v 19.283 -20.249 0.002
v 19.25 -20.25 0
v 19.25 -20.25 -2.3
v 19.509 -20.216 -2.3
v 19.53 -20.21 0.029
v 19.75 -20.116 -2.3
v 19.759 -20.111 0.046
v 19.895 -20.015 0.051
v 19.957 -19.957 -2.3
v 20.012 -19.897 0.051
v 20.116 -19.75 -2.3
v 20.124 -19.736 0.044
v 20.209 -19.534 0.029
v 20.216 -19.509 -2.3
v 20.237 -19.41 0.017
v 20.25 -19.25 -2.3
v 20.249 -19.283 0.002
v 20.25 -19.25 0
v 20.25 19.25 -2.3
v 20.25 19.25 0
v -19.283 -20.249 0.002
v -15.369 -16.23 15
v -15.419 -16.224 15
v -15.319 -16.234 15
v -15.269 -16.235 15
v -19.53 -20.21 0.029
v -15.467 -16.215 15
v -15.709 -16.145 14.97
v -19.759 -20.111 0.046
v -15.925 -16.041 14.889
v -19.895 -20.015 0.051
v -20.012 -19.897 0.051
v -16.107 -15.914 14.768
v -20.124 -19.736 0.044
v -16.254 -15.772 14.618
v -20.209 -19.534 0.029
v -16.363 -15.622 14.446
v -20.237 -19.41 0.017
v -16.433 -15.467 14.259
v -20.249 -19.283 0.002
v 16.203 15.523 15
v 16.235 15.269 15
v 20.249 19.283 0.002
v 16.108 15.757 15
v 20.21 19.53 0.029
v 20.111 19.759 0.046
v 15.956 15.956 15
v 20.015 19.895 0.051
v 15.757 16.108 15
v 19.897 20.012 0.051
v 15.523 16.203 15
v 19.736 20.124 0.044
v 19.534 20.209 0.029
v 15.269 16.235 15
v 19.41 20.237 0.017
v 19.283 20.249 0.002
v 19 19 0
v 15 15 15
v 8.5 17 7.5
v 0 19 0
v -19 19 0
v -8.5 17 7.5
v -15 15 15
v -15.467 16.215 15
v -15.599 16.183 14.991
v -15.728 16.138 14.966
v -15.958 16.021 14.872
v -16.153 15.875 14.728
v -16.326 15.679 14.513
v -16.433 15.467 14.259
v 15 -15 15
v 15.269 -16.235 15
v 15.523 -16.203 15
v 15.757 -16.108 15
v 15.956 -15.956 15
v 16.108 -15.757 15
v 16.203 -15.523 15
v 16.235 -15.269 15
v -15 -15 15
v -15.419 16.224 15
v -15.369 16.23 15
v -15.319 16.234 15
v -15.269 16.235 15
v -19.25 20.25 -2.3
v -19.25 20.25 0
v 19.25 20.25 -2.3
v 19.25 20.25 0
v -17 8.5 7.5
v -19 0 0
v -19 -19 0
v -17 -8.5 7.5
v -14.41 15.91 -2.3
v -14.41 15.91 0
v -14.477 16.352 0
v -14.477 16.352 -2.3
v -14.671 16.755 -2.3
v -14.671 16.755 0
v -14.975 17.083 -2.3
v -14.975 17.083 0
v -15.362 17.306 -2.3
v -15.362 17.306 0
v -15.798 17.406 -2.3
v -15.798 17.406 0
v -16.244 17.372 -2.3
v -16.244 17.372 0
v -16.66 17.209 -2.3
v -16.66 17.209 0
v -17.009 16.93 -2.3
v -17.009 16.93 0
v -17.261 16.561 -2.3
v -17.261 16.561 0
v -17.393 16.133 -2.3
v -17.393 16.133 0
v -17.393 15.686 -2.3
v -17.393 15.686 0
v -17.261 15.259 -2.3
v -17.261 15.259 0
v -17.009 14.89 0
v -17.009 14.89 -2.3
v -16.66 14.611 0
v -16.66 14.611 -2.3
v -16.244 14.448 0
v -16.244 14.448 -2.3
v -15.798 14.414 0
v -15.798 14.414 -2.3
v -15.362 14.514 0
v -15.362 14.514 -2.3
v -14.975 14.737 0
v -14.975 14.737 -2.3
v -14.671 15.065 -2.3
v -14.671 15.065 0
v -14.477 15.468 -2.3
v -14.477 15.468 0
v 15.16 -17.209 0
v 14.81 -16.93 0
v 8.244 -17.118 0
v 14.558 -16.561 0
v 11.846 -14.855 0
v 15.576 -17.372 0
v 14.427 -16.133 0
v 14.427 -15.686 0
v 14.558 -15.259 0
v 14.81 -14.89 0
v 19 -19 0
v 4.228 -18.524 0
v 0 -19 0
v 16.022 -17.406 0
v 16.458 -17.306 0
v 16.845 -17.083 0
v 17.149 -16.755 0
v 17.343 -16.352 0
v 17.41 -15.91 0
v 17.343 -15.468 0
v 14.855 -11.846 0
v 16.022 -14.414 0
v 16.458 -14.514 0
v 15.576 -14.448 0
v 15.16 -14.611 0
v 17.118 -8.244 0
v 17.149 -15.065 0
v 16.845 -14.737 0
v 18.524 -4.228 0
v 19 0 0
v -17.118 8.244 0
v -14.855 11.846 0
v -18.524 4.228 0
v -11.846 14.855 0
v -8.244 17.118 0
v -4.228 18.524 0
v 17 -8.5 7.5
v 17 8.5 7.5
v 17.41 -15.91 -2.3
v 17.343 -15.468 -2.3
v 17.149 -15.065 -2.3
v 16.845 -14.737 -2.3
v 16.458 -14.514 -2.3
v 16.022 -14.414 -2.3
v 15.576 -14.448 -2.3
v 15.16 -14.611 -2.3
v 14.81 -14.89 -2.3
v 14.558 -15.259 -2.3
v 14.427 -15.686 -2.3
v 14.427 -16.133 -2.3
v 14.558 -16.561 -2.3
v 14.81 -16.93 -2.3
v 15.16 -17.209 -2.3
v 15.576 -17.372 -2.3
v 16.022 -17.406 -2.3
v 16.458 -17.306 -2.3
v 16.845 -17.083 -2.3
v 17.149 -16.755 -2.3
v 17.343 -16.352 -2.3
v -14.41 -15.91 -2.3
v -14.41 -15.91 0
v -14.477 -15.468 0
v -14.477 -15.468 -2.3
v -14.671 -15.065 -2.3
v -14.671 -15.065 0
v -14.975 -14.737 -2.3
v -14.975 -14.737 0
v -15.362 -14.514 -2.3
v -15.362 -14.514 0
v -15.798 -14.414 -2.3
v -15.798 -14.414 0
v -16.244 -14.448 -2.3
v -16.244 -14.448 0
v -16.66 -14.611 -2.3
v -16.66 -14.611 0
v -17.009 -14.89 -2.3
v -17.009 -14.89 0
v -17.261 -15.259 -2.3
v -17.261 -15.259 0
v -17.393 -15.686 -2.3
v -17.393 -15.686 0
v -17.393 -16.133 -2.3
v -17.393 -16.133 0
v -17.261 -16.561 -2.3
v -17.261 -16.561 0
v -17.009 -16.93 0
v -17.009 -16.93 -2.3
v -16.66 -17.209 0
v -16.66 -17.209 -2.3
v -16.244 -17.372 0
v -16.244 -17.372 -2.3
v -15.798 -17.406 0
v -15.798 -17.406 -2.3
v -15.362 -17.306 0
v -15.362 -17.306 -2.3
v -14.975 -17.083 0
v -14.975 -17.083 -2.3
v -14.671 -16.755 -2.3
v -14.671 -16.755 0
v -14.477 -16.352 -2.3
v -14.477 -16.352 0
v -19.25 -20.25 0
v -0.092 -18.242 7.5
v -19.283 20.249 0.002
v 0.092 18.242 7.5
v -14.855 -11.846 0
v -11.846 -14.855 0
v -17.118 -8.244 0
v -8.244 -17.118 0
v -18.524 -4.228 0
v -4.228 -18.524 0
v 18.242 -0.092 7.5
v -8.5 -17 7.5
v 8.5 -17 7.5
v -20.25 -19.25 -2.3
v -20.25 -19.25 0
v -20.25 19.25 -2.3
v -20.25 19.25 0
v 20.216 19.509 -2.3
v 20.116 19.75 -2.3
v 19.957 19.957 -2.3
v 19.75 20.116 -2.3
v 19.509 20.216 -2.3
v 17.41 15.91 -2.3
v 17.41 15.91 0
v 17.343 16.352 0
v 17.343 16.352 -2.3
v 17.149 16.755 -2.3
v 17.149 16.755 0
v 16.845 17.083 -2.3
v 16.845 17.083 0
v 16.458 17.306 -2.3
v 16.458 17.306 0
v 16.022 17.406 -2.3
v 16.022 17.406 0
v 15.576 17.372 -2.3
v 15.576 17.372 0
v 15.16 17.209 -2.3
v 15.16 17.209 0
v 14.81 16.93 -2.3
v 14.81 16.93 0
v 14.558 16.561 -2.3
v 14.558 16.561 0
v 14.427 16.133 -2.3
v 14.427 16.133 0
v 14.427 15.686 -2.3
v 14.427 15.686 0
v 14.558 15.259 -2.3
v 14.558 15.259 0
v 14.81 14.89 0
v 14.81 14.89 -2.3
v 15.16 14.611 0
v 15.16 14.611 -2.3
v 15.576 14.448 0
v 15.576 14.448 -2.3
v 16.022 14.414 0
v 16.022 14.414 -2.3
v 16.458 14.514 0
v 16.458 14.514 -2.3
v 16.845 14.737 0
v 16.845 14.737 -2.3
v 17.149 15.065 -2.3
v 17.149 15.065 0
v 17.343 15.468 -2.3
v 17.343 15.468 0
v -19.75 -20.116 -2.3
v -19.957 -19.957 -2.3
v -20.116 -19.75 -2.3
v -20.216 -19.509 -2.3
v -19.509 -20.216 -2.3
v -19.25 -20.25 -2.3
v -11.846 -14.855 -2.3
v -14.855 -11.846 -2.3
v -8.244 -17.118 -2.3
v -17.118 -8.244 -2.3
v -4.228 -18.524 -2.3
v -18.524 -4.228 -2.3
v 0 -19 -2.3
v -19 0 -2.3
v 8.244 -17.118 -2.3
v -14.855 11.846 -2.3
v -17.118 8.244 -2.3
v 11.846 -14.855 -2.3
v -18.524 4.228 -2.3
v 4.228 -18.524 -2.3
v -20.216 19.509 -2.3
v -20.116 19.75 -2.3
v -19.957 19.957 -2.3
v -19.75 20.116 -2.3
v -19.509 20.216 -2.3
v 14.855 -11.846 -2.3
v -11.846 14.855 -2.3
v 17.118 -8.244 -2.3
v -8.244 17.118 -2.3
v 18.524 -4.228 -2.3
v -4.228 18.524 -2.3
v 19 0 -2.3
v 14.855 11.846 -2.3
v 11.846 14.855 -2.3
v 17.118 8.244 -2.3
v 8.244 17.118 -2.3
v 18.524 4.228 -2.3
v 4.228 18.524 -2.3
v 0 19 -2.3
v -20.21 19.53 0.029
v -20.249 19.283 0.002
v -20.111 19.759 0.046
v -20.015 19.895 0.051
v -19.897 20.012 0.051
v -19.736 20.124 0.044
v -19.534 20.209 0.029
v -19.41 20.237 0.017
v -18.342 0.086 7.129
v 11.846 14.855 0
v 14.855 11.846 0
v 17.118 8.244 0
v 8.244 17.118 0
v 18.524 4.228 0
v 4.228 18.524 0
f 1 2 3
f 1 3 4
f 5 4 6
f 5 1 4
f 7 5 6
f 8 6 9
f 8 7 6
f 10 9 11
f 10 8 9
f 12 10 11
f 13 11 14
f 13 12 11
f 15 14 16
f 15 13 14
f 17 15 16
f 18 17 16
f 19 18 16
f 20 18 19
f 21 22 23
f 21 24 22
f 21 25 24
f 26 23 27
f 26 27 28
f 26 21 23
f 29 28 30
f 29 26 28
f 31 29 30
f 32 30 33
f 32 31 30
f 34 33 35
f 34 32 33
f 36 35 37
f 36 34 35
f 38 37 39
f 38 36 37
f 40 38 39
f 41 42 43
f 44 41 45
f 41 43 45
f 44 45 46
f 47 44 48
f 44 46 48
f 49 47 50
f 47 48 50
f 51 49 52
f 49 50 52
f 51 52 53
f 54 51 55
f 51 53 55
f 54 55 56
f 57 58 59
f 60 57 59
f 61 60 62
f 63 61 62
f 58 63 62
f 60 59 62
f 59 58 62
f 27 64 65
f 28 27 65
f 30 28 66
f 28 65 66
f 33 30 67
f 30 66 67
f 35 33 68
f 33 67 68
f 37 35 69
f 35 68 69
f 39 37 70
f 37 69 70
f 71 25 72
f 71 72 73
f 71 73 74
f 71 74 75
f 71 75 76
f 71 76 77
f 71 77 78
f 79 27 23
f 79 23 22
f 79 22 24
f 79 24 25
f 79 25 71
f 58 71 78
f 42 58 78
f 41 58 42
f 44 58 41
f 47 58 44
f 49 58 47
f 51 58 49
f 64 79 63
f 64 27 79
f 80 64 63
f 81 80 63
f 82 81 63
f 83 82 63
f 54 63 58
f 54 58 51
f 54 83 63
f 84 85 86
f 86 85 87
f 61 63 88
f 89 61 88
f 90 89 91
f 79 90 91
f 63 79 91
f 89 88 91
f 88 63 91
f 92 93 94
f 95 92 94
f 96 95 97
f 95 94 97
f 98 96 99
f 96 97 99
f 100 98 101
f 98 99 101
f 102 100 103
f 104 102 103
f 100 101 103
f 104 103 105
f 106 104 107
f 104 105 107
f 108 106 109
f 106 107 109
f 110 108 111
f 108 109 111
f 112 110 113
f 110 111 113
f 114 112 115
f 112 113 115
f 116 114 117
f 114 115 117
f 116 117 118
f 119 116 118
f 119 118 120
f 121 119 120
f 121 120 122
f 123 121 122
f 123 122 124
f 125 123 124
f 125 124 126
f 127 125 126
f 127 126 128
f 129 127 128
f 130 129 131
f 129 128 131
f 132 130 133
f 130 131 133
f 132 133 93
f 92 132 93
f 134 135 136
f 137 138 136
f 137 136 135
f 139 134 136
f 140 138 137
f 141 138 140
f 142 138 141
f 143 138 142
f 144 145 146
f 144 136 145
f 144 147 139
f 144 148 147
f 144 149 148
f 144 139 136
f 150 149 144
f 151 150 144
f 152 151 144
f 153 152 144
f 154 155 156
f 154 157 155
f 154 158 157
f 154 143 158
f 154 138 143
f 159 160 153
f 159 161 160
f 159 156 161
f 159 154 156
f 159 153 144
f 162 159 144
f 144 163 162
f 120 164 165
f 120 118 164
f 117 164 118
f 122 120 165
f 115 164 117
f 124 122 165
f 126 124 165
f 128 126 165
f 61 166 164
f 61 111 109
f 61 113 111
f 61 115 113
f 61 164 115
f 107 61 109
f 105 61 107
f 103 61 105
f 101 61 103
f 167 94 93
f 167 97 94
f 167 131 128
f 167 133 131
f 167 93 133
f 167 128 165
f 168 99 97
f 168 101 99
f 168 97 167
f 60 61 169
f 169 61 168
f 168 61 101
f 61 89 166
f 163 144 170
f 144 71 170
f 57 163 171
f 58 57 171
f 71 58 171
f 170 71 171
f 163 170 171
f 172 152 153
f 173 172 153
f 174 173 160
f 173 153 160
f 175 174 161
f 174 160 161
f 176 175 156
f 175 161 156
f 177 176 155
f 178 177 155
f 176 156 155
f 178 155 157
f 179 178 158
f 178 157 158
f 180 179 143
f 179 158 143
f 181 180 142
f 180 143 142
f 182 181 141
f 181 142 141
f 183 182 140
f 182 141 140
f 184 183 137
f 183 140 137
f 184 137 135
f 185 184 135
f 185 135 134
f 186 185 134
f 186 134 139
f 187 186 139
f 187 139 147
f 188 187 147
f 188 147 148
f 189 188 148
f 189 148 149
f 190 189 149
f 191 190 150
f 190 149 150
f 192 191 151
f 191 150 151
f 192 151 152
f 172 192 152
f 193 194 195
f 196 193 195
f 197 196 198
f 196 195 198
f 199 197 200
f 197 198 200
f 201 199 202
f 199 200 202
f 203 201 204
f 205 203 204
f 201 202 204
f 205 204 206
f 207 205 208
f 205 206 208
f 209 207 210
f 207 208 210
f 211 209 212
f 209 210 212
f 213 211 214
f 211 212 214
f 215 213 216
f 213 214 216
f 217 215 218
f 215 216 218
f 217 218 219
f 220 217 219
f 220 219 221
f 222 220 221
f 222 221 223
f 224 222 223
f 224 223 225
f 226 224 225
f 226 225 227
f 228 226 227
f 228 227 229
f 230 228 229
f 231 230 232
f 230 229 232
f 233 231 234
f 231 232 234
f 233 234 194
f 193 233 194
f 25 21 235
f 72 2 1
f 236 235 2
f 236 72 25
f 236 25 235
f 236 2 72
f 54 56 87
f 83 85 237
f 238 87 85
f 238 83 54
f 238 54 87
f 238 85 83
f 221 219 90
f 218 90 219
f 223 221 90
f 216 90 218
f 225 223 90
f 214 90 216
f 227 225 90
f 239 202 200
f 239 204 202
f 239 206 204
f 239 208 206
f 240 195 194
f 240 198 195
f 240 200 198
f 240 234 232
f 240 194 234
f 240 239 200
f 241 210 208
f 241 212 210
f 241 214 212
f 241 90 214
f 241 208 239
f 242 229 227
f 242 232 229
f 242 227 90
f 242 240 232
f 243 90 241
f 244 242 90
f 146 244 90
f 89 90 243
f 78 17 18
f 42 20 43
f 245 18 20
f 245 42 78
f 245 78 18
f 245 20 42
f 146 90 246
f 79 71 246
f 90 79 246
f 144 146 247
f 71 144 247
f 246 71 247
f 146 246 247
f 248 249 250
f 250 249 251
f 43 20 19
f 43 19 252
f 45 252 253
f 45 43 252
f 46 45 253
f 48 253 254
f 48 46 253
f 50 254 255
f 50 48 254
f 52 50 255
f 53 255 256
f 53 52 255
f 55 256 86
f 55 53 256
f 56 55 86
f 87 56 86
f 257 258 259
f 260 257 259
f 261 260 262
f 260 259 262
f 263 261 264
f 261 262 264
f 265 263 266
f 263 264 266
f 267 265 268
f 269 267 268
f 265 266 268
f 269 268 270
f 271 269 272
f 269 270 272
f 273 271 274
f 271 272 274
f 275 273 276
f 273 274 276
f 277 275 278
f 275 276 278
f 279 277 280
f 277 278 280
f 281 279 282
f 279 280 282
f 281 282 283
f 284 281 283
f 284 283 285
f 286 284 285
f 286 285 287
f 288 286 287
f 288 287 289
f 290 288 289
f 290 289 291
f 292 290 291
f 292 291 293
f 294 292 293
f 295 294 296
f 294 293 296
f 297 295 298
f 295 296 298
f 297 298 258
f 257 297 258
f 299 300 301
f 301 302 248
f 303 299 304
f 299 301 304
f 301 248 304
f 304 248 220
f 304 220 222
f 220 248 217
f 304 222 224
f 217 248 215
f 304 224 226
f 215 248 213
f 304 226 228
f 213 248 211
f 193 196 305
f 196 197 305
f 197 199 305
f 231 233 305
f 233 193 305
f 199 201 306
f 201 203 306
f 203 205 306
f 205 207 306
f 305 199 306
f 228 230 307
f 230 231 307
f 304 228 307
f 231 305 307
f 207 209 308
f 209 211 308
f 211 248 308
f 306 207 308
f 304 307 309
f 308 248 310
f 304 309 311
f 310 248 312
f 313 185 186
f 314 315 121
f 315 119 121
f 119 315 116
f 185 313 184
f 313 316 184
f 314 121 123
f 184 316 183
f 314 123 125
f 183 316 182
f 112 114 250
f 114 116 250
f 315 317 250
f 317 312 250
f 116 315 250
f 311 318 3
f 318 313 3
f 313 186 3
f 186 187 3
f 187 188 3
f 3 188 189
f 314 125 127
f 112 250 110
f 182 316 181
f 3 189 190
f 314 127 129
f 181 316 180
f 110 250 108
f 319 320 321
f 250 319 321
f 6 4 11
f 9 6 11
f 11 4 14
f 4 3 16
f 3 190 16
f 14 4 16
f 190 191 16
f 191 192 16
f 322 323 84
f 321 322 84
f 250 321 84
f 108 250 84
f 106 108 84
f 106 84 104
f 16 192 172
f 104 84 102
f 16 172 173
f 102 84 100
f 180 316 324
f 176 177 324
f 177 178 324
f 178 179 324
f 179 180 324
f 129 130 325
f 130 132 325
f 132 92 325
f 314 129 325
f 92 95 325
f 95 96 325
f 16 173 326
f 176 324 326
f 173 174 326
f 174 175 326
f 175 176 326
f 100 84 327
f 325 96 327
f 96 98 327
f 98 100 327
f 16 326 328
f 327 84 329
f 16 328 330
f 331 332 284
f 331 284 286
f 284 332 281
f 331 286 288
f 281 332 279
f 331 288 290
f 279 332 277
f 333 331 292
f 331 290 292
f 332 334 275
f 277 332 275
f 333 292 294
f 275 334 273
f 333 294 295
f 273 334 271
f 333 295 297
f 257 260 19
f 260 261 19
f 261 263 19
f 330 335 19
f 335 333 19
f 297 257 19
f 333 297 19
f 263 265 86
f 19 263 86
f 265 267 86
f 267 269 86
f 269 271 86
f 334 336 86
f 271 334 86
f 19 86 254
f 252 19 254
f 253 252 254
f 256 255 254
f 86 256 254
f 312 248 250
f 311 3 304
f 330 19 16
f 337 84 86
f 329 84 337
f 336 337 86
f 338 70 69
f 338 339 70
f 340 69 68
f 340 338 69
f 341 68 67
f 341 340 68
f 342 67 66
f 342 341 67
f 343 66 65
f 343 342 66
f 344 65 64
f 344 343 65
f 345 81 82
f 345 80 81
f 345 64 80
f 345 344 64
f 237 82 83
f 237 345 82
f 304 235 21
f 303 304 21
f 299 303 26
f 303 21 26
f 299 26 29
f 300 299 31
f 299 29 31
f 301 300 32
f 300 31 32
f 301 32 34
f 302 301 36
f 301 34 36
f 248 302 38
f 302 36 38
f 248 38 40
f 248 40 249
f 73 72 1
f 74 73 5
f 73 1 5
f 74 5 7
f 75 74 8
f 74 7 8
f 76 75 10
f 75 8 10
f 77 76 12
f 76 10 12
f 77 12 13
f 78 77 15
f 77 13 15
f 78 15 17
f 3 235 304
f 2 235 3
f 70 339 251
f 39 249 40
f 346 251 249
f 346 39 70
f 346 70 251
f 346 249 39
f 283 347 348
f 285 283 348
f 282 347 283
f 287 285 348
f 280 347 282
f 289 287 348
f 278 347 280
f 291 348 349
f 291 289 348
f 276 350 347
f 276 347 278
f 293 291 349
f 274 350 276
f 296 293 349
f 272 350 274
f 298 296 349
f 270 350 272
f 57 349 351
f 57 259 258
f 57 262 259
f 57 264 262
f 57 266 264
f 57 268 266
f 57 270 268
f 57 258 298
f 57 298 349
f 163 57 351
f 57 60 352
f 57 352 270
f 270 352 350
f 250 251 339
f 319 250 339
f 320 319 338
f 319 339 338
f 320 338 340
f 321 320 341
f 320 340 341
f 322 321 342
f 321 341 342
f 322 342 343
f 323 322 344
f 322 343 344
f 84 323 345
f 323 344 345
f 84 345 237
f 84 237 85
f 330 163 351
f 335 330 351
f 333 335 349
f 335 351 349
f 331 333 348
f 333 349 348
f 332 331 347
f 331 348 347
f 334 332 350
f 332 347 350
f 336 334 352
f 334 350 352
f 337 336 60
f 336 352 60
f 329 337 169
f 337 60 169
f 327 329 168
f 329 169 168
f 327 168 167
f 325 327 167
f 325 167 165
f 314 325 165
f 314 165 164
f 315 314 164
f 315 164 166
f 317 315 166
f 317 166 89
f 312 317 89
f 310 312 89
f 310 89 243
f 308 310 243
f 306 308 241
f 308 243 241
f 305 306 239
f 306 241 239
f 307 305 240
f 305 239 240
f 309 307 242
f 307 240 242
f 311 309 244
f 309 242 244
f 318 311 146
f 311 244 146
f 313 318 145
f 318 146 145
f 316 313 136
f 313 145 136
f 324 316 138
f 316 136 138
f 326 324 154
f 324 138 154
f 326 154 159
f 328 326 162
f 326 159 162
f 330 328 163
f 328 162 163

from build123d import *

# Parameters (mm, degrees)
F0_W         = 40.5
F0_H         = 40.5
F2_W         = 32.47
F2_H         = 32.47
F4_W         = 38
F4_H         = 38
F5_W         = 30
F5_H         = 30
F7_W         = 40.5
F7_H         = 40.5
F7_R         = 1.5
F7_R_2       = 19
F8_DEPTH     = 2.3
F9_T3_DEPTH  = 22.3515662211
F9_T6_DEPTH  = 9.05
F9_T9_DEPTH  = 9.05
F9_T12_DEPTH = 22.3515662211
F9_T15_DEPTH = 22.3515662211
F9_T18_DEPTH = 9.05
F9_T21_DEPTH = 22.3515662211
F9_T24_DEPTH = 9.05
F9_T27_DEPTH = 36.3076821333


# Not quite as in the source:
# - a fillet or chamfer that OpenCascade refuses, or shapes differently, is made with other operations: its cross-section is extruded or revolved along the edge and cut away or added


with BuildPart() as f3:
    # F0 (on Top) → F3 section 0
    with BuildSketch(Plane.XY):
        Rectangle(F0_W, F0_H)
    # F2 (on offset) → F3 section 1
    with BuildSketch(Plane.XY.offset(15)):
        Rectangle(F2_W, F2_H)
    loft()

    # F4 (on face) → F6 section 0
    with BuildSketch(Plane.XY):
        Rectangle(F4_W, F4_H)
    # F5 (on face) → F6 section 1
    with BuildSketch(Plane.XY.offset(15)):
        Rectangle(F5_W, F5_H)
    loft(mode=Mode.SUBTRACT)

    # F7 (on face) → F8 (join)
    with BuildSketch(Plane.XY):
        Rectangle(F7_W, F7_H)
        with Locations((-15.9099025767, -15.9099025767)):
            Circle(F7_R, mode=Mode.SUBTRACT)
        with Locations((15.9099025767, -15.9099025767)):
            Circle(F7_R, mode=Mode.SUBTRACT)
        with Locations((-15.9099025767, 15.9099025767)):
            Circle(F7_R, mode=Mode.SUBTRACT)
        Circle(F7_R_2, mode=Mode.SUBTRACT)
        with Locations((15.9099025767, 15.9099025767)):
            Circle(F7_R, mode=Mode.SUBTRACT)
    extrude(amount=-F8_DEPTH)

    # F9: fillet of radius 1 on 9 edges, made by hand


with BuildPart() as f9_tool1:
    # F9_s2 → F9_t3 (new body)
    with BuildSketch(Plane(origin=(-3.5329799901, -3.5329799901, -13.1991780453), x_dir=(-0.7071067812, 0.7071067812, 0), z_dir=(0.2503317407, 0.2503317407, 0.9352368893))):
        with BuildLine():
            ThreePointArc((-0.6830609237, 26.1443262584), (0, 26.4139648585), (0.6830609237, 26.1443262584))
            Line((0.6830609237, 26.1443262584), (0, 26.783150032))
            Line((0, 26.783150032), (-0.6830609237, 26.1443262584))
        make_face()
    extrude(amount=F9_T3_DEPTH)


with BuildPart() as f9_tool4:
    # F9_s5 → F9_t6 (new body)
    with BuildSketch(Plane.XY.offset(4.25)):
        with BuildLine():
            ThreePointArc((-19.25, -20.25), (-19.9571067812, -19.9571067812), (-20.25, -19.25))
            Line((-20.25, -19.25), (-20.25, -20.25))
            Line((-20.25, -20.25), (-19.25, -20.25))
        make_face()
    extrude(amount=-F9_T6_DEPTH)


with BuildPart() as f9_tool7:
    # F9_s8 → F9_t9 (new body)
    with BuildSketch(Plane.XY.offset(4.25)):
        with BuildLine():
            ThreePointArc((-20.25, 19.25), (-19.9571067812, 19.9571067812), (-19.25, 20.25))
            Line((-19.25, 20.25), (-20.25, 20.25))
            Line((-20.25, 20.25), (-20.25, 19.25))
        make_face()
    extrude(amount=-F9_T9_DEPTH)


with BuildPart() as f9_tool10:
    # F9_s11 → F9_t12 (new body)
    with BuildSketch(Plane(origin=(-3.5329799901, 3.5329799901, -13.1991780453), x_dir=(0.7071067812, 0.7071067812, 0), z_dir=(0.2503317407, -0.2503317407, 0.9352368893))):
        with BuildLine():
            ThreePointArc((-0.6830609237, 26.1443262584), (0, 26.4139648585), (0.6830609237, 26.1443262584))
            Line((0.6830609237, 26.1443262584), (0, 26.783150032))
            Line((0, 26.783150032), (-0.6830609237, 26.1443262584))
        make_face()
    extrude(amount=F9_T12_DEPTH)


with BuildPart() as f9_tool13:
    # F9_s14 → F9_t15 (new body)
    with BuildSketch(Plane(origin=(3.5329799901, 3.5329799901, -13.1991780453), x_dir=(0.7071067812, -0.7071067812, 0), z_dir=(-0.2503317407, -0.2503317407, 0.9352368893))):
        with BuildLine():
            ThreePointArc((0.6830609237, 26.1443262584), (0, 26.4139648585), (-0.6830609237, 26.1443262584))
            Line((-0.6830609237, 26.1443262584), (0, 26.783150032))
            Line((0, 26.783150032), (0.6830609237, 26.1443262584))
        make_face()
    extrude(amount=F9_T15_DEPTH)


with BuildPart() as f9_tool16:
    # F9_s17 → F9_t18 (new body)
    with BuildSketch(Plane.XY.offset(4.25)):
        with BuildLine():
            ThreePointArc((20.25, 19.25), (19.9571067812, 19.9571067812), (19.25, 20.25))
            Line((19.25, 20.25), (20.25, 20.25))
            Line((20.25, 20.25), (20.25, 19.25))
        make_face()
    extrude(amount=-F9_T18_DEPTH)


with BuildPart() as f9_tool19:
    # F9_s20 → F9_t21 (new body)
    with BuildSketch(Plane(origin=(3.5329799901, -3.5329799901, -13.1991780453), x_dir=(-0.7071067812, -0.7071067812, 0), z_dir=(-0.2503317407, 0.2503317407, 0.9352368893))):
        with BuildLine():
            ThreePointArc((0.6830609237, 26.1443262584), (0, 26.4139648585), (-0.6830609237, 26.1443262584))
            Line((-0.6830609237, 26.1443262584), (0, 26.783150032))
            Line((0, 26.783150032), (0.6830609237, 26.1443262584))
        make_face()
    extrude(amount=F9_T21_DEPTH)


with BuildPart() as f9_tool22:
    # F9_s23 → F9_t24 (new body)
    with BuildSketch(Plane.XY.offset(4.25)):
        with BuildLine():
            ThreePointArc((19.25, -20.25), (19.9571067812, -19.9571067812), (20.25, -19.25))
            Line((20.25, -19.25), (20.25, -20.25))
            Line((20.25, -20.25), (19.25, -20.25))
        make_face()
    extrude(amount=-F9_T24_DEPTH)


with BuildPart() as f9_tool25:
    # F9_s26 → F9_t27 (new body)
    with BuildSketch(Plane.XZ.offset(-18.1538410667)):
        with BuildLine():
            ThreePointArc((-15.4674635733, 15), (-16.0763295685, 14.7932730929), (-16.4334575956, 14.2585644))
            Line((-16.4334575956, 14.2585644), (-16.235, 15))
            Line((-16.235, 15), (-15.4674635733, 15))
        make_face()
    extrude(amount=F9_T27_DEPTH)


with BuildPart() as f3_1:
    add(f3.part)

    # F9_t28: cut F9_tool1, F9_tool4, F9_tool7, F9_tool10, F9_tool13, F9_tool16, F9_tool19, F9_tool22, F9_tool25
    add([f9_tool1.part, f9_tool4.part, f9_tool7.part, f9_tool10.part, f9_tool13.part, f9_tool16.part, f9_tool19.part, f9_tool22.part, f9_tool25.part], mode=Mode.SUBTRACT)


solid = f3_1.part
